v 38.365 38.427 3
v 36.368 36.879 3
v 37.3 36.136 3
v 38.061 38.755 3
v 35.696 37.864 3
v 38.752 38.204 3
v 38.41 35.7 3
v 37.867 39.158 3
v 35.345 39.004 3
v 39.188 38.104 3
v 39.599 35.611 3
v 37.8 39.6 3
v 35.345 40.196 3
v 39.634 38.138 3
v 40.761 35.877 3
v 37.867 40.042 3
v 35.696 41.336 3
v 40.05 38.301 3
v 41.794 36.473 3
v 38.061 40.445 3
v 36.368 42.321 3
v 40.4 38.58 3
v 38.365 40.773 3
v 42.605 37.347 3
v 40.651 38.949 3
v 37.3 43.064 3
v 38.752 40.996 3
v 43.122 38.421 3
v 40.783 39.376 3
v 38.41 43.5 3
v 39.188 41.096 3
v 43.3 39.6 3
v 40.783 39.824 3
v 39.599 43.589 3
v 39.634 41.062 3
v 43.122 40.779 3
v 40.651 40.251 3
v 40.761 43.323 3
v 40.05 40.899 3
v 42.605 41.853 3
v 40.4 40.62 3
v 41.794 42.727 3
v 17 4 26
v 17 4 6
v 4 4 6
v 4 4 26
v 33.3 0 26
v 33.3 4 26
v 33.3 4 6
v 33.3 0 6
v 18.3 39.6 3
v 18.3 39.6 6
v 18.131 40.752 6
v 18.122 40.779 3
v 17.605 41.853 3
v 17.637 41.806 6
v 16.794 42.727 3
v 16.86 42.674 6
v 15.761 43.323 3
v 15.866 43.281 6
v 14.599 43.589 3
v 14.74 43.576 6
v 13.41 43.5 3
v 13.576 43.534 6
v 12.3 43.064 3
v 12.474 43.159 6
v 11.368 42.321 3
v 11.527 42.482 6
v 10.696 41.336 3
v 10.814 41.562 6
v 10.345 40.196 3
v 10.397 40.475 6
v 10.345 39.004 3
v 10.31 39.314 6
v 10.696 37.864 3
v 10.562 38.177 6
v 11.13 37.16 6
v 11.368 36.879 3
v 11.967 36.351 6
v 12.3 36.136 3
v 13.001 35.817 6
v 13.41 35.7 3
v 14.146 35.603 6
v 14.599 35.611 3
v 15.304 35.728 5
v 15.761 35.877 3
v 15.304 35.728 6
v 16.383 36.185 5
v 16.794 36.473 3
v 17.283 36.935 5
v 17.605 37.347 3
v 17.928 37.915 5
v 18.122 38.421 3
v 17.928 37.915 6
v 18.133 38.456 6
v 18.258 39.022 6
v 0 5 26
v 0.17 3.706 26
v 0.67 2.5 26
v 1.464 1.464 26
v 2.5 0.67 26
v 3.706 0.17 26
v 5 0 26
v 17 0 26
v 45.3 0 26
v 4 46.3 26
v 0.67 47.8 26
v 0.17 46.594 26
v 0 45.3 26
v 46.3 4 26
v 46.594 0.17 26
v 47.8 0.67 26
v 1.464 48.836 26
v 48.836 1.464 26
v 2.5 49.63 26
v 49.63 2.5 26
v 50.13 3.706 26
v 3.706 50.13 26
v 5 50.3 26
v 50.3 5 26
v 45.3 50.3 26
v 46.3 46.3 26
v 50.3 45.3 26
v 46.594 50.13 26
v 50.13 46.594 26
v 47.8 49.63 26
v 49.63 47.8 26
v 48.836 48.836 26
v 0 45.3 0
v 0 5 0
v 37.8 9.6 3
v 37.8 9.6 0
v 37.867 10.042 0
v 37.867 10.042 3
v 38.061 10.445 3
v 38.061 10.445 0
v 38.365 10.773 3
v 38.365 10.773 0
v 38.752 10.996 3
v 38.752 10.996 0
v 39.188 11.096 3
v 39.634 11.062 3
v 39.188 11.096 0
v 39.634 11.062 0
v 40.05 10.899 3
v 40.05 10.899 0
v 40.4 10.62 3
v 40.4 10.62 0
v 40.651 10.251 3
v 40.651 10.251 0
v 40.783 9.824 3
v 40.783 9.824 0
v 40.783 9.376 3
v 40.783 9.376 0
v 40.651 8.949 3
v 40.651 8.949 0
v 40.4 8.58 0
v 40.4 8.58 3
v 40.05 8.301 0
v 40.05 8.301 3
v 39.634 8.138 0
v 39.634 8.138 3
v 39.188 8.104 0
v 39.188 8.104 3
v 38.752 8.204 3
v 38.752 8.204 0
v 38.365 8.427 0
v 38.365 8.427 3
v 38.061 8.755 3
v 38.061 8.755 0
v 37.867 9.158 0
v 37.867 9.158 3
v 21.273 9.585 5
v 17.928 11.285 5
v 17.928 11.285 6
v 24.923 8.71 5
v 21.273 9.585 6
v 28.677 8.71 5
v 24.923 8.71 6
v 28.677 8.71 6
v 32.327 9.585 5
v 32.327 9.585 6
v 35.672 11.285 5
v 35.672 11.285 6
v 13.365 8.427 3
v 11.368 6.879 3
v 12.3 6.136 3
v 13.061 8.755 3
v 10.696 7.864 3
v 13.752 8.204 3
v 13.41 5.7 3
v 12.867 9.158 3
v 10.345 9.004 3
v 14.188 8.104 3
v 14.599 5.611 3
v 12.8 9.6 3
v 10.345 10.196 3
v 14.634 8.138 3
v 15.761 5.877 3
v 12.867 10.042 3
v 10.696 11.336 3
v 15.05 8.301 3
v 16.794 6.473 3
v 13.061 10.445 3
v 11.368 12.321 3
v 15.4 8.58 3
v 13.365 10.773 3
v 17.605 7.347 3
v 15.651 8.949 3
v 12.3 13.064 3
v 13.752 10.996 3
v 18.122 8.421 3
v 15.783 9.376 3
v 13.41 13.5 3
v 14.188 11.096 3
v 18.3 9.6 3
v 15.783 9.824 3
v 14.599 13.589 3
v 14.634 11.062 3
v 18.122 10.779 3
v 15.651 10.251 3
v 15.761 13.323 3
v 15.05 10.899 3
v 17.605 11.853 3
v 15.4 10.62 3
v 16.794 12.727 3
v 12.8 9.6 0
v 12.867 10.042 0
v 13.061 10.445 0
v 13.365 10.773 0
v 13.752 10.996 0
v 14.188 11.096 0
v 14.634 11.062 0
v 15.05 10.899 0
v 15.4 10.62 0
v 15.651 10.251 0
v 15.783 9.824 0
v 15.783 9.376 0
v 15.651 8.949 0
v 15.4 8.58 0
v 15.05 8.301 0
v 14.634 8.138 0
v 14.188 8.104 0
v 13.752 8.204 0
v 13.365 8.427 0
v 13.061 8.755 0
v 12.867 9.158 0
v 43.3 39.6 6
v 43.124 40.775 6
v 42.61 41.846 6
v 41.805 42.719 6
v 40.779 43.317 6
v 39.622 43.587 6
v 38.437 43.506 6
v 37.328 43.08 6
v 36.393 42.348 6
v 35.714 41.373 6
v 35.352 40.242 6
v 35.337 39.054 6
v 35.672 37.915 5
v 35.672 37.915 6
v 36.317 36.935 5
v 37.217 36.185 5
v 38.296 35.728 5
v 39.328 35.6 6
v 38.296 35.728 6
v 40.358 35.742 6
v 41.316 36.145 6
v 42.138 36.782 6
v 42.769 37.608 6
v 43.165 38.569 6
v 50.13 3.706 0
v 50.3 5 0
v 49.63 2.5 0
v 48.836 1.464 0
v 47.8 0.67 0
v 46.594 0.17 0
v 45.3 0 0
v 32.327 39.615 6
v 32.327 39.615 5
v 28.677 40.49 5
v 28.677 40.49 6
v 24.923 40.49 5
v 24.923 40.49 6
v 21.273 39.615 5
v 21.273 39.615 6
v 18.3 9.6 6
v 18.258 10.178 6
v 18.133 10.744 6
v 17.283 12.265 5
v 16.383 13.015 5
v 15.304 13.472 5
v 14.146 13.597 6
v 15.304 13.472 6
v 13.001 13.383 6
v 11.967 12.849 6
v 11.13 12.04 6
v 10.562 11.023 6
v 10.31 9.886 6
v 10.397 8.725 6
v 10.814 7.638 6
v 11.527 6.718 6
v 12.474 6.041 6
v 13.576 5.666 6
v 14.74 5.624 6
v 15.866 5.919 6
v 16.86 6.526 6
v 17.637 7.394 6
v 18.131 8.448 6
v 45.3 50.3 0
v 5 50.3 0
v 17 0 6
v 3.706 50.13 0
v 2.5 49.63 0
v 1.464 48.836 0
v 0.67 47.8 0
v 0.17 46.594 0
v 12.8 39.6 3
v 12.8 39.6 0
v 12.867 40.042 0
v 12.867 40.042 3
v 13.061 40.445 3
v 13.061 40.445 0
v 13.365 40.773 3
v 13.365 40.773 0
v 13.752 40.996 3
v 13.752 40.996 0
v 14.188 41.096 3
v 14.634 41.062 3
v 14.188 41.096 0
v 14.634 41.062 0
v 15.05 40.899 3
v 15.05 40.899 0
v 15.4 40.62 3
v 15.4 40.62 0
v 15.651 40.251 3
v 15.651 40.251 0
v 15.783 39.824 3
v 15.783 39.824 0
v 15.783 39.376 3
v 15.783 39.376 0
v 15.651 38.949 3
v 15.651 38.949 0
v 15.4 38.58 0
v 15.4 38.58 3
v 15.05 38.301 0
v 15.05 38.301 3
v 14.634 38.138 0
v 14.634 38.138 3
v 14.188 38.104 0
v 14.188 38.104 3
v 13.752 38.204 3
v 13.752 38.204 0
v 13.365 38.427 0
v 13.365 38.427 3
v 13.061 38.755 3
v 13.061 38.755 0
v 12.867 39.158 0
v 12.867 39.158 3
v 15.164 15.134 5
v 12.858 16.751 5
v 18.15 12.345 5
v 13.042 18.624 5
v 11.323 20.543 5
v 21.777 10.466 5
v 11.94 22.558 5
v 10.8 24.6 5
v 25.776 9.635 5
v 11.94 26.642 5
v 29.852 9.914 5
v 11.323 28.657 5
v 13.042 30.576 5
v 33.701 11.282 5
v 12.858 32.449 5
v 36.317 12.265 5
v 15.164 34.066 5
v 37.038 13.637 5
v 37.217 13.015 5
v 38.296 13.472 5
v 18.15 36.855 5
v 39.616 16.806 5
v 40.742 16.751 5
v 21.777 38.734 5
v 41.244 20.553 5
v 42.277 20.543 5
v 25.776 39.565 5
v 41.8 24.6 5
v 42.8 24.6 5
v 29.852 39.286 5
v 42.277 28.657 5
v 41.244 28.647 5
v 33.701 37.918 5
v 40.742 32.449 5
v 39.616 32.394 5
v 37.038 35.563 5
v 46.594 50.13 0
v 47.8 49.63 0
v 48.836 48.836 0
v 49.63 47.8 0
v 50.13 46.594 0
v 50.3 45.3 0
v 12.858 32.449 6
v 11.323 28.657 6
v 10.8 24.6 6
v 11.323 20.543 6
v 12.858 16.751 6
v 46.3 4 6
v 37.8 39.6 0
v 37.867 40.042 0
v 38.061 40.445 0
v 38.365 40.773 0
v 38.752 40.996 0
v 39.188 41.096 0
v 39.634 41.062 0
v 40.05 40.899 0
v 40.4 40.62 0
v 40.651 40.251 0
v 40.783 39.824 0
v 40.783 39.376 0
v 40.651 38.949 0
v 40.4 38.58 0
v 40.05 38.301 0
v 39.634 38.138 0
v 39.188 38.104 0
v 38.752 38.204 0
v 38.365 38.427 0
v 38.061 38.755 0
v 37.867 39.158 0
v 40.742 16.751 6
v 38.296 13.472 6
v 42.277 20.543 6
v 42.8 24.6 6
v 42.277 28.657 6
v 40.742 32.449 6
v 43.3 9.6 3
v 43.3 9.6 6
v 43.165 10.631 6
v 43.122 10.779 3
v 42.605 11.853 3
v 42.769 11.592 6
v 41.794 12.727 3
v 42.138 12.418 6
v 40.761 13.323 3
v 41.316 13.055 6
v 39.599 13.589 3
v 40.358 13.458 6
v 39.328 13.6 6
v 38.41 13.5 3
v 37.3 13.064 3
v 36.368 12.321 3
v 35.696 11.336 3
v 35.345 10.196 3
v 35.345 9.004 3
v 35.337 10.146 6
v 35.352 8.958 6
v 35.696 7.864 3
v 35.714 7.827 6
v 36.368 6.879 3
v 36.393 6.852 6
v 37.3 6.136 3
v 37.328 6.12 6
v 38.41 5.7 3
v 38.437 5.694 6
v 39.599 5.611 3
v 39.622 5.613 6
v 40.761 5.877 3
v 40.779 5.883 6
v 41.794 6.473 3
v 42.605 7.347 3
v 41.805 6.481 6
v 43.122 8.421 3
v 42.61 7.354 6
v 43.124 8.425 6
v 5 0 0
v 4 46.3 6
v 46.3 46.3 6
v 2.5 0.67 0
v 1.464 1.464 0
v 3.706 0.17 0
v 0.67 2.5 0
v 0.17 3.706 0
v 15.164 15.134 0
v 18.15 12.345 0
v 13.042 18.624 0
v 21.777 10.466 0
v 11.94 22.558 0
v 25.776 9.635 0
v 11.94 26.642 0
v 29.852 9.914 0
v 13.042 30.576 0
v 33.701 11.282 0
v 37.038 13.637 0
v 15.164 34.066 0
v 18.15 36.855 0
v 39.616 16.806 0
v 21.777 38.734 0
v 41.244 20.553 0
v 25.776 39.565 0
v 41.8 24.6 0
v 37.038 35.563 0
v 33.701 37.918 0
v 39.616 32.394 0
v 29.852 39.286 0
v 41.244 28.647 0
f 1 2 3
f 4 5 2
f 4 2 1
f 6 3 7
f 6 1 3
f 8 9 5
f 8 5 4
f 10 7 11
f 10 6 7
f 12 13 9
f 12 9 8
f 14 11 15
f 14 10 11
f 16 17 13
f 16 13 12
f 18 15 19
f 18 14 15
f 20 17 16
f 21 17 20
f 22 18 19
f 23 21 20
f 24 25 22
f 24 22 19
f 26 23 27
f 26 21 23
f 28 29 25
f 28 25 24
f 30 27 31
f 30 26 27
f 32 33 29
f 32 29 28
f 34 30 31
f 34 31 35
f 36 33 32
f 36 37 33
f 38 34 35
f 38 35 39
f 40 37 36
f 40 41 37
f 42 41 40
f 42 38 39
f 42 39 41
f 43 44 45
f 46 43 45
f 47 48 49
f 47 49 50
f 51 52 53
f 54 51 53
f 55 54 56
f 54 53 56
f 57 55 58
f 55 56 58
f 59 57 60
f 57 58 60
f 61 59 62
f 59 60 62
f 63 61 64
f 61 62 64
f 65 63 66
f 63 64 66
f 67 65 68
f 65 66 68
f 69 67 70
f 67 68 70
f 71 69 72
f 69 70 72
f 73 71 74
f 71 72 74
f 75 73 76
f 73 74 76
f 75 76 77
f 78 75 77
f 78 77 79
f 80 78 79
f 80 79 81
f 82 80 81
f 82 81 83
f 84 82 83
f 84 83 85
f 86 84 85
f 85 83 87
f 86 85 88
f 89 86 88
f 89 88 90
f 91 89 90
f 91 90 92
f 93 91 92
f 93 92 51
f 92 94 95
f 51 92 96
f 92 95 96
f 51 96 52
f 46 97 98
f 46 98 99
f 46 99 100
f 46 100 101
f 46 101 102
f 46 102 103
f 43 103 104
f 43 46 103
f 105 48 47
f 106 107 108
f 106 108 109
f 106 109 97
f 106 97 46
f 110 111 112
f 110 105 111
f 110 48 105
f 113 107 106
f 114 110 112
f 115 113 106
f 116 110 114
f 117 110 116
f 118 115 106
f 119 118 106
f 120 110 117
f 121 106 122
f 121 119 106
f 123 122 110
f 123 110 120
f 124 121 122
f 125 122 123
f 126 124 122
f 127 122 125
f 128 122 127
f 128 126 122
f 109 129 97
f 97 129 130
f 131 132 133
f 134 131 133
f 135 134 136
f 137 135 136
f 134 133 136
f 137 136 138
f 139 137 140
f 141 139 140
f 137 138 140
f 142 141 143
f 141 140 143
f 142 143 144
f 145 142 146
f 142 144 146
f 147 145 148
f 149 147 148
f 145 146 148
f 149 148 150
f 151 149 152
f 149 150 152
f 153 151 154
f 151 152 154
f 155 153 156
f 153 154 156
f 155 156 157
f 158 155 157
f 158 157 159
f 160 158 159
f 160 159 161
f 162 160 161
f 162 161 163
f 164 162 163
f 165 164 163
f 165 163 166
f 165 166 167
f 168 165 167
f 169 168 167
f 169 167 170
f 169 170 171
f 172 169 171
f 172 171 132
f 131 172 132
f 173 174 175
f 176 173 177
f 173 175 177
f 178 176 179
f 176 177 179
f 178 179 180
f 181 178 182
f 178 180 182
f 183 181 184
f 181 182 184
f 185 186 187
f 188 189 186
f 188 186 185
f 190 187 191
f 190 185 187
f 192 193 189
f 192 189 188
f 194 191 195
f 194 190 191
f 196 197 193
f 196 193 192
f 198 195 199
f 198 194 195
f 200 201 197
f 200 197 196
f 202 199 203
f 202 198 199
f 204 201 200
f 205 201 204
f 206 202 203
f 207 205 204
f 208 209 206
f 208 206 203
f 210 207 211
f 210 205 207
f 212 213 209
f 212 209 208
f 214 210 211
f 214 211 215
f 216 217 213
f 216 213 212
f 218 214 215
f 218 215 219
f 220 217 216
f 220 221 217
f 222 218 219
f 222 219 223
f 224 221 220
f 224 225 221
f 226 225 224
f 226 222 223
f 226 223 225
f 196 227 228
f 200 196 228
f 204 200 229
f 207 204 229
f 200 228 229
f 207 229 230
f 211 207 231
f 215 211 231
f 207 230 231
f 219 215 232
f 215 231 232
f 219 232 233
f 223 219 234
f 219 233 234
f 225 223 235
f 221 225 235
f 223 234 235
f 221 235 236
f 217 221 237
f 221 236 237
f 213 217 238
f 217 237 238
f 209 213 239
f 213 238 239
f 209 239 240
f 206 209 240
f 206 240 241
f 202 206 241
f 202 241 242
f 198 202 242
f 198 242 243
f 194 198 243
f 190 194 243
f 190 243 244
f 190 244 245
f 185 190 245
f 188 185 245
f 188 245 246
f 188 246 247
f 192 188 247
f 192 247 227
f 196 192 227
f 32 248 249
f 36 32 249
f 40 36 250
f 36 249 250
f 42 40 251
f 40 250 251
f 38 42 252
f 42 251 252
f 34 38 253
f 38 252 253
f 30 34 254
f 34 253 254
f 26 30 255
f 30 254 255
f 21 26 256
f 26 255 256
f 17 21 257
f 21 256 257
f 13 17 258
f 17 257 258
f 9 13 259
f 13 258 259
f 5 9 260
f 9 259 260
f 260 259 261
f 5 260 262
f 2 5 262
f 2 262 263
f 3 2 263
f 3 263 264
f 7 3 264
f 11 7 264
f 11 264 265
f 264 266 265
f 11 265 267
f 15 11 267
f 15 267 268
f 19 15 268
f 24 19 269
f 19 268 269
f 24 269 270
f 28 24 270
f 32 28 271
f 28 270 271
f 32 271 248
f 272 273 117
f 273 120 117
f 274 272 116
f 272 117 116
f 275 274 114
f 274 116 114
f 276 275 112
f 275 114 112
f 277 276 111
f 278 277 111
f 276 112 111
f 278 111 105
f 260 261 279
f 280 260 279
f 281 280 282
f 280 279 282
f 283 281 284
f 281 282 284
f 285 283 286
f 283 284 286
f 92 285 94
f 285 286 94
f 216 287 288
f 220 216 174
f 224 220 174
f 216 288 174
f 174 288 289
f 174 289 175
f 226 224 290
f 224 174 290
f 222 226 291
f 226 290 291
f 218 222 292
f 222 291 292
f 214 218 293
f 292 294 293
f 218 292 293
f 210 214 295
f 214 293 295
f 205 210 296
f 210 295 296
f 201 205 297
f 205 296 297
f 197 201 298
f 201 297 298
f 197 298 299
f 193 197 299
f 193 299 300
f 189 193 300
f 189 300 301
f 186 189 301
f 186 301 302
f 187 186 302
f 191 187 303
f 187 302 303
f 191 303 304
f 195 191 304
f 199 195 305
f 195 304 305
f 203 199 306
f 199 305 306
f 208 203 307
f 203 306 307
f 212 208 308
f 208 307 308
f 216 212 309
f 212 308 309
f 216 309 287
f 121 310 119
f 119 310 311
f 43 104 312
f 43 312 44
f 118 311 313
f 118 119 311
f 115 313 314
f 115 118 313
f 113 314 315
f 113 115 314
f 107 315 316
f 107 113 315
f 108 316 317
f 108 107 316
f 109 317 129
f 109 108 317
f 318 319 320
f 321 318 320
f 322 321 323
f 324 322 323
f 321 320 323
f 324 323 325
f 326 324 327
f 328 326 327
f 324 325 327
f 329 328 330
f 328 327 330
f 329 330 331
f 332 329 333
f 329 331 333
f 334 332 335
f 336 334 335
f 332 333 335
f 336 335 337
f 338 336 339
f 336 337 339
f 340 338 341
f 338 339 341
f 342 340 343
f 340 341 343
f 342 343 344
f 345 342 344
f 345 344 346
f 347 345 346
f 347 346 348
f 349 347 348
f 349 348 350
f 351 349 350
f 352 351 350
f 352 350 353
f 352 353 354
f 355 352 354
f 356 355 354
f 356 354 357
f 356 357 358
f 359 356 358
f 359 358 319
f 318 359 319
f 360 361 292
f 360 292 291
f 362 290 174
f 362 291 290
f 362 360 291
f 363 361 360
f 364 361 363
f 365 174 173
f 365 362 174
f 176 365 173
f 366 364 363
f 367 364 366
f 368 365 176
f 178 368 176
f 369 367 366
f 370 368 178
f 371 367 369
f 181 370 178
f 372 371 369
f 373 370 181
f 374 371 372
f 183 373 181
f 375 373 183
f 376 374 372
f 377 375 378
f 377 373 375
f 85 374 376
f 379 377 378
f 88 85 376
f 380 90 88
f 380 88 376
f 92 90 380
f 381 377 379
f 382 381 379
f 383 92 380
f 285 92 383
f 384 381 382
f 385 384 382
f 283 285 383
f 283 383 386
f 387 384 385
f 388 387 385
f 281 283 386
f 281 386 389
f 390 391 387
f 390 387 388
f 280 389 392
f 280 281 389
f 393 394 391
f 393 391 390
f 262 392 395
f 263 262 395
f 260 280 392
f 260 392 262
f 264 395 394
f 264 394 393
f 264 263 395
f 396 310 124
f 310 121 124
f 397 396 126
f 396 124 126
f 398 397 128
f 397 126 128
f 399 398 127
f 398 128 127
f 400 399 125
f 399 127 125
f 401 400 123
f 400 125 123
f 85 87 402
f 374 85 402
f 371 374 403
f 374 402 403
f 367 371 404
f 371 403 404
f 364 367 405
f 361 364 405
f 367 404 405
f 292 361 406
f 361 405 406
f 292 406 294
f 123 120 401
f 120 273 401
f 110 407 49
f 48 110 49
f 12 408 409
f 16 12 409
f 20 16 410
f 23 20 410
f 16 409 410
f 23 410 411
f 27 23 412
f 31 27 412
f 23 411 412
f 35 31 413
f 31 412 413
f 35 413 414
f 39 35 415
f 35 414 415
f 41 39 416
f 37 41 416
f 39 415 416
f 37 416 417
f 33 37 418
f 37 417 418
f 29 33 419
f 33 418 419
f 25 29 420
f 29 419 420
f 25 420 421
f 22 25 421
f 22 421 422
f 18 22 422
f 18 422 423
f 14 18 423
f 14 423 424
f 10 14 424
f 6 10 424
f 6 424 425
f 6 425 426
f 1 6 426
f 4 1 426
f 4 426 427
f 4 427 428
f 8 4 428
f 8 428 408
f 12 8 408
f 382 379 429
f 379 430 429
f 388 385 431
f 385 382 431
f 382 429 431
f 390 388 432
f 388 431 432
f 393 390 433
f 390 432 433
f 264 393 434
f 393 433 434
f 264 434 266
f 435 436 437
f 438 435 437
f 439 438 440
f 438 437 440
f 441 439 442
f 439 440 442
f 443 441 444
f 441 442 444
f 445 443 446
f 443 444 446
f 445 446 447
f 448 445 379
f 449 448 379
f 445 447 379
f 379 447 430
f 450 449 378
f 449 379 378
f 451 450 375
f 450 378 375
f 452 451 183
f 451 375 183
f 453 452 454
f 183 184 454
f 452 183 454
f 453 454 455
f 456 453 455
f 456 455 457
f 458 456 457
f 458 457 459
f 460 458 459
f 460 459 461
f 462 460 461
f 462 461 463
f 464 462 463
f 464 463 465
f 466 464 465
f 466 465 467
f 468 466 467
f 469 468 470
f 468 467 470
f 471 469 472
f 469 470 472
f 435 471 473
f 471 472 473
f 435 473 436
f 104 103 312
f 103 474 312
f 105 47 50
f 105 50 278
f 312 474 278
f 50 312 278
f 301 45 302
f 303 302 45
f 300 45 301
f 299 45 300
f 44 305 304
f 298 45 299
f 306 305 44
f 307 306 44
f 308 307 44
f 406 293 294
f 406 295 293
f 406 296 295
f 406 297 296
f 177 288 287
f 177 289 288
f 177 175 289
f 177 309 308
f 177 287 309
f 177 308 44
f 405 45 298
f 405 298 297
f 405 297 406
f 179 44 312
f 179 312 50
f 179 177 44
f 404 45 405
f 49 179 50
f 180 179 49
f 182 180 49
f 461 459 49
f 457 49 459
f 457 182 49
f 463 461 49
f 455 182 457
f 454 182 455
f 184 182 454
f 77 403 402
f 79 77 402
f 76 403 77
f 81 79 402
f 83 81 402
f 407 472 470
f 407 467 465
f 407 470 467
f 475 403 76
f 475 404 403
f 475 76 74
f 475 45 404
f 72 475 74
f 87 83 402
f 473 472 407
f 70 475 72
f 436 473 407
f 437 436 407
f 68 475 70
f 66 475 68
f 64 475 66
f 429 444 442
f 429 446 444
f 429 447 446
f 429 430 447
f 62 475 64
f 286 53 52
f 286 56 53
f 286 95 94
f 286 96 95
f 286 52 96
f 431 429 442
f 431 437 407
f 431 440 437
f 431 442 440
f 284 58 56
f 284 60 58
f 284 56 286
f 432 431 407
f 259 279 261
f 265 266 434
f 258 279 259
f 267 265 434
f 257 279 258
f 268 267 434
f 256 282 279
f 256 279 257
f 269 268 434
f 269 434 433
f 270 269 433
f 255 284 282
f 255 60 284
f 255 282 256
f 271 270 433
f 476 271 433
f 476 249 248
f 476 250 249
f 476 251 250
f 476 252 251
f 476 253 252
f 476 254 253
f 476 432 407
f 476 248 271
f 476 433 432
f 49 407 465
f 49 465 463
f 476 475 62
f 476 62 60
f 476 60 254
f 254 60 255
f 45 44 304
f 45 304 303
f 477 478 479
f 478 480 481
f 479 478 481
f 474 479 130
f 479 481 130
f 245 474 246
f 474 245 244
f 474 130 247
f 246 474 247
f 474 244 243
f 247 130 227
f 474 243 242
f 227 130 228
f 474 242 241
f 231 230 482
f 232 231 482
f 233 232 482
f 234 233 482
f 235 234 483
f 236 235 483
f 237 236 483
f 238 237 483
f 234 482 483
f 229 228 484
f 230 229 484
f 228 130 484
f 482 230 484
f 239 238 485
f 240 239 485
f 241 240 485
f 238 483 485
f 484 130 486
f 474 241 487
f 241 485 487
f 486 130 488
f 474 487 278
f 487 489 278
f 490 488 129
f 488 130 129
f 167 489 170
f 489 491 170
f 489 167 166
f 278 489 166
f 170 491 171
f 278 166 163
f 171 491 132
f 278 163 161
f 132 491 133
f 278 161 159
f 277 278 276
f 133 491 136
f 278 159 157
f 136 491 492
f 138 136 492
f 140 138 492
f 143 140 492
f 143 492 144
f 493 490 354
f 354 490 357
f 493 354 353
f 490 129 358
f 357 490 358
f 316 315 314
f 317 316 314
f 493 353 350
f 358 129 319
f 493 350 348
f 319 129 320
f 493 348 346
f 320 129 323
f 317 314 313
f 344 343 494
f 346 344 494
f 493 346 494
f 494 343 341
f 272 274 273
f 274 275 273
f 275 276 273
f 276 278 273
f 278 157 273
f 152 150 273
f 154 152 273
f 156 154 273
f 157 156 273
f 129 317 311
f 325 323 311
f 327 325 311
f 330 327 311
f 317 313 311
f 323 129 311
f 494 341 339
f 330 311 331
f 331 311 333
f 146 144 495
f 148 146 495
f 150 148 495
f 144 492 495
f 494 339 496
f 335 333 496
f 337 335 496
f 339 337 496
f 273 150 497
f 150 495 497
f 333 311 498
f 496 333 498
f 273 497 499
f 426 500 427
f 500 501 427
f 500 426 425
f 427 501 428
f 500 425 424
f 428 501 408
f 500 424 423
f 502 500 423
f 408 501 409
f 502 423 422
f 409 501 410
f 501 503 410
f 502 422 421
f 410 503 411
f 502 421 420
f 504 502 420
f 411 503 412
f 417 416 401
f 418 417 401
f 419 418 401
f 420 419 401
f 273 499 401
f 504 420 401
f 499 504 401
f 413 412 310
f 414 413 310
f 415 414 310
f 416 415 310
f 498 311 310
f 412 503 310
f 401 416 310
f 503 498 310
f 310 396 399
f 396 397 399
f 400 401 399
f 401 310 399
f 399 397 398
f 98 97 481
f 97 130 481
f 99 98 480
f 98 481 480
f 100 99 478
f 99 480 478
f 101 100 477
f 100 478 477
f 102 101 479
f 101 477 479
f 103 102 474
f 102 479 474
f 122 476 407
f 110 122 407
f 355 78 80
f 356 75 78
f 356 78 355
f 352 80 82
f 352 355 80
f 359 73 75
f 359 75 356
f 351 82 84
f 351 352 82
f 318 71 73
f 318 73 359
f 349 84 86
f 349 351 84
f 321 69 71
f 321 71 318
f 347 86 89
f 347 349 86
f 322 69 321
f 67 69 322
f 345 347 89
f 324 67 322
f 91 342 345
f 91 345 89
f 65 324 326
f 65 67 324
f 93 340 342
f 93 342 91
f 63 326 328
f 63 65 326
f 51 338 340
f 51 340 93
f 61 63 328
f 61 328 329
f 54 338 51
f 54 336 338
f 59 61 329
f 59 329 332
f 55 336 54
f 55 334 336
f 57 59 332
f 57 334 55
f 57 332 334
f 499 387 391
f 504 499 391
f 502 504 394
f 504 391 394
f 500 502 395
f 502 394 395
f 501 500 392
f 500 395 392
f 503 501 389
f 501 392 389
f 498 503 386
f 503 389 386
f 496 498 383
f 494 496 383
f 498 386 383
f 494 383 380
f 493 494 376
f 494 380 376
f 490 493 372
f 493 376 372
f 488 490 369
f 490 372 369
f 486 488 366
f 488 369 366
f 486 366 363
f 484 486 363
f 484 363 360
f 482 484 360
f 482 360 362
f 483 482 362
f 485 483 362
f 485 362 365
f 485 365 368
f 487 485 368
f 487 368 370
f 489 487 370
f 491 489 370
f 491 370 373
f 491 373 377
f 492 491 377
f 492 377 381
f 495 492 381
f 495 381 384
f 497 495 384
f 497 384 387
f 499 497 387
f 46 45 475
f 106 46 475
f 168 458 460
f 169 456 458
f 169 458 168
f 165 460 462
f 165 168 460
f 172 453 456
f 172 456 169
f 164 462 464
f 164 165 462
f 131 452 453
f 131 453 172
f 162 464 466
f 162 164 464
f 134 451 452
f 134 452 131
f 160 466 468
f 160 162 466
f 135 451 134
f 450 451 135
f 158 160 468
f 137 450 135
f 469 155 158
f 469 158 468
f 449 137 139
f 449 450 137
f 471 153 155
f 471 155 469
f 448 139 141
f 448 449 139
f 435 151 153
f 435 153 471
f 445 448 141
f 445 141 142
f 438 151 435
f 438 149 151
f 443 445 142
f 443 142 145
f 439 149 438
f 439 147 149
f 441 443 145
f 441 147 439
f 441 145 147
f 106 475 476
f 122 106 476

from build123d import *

# Parameters (mm, degrees)
ESQUISSE1_W             = 50.3
ESQUISSE1_H             = 50.3
BOSS_EXTRU_1_DEPTH      = 6
BOSS_EXTRU_2_DEPTH      = 20
ESQUISSE3_R             = 1.5
ENL_V_MAT_EXTRU_1_DEPTH = 76.737573238
CONG_2_R                = 5
ESQUISSE4_R             = 4
ENL_V_MAT_EXTRU_2_DEPTH = 3
CONG_6_R                = 5
ESQUISSE5_R             = 16
ENL_V_MAT_EXTRU_3_DEPTH = 1
ESQUISSE6_R             = 15
ENL_V_MAT_EXTRU_4_DEPTH = 21


with BuildPart() as part:
    # Esquisse1 → Boss.-Extru.1 (new body)
    with BuildSketch(Plane.XY):
        with Locations((25.15, 25.15)):
            Rectangle(ESQUISSE1_W, ESQUISSE1_H)
    extrude(amount=BOSS_EXTRU_1_DEPTH)

    # Esquisse2 → Boss.-Extru.2 (add)
    with BuildSketch(Plane.XY.offset(6)):
        Polygon((4, 46.3), (46.3, 46.3), (46.3, 4), (33.3, 4), (33.3, 0), (50.3, 0), (50.3, 50.3), (0, 50.3), (0, 0), (17, 0), (17, 4), (4, 4), align=None)
    extrude(amount=BOSS_EXTRU_2_DEPTH)

    # Esquisse3 → Enlèv. mat.-Extru.1 (cut, through all)
    with BuildSketch(Plane(origin=(0, 0, 0), x_dir=(-1, 0, 0), z_dir=(0, 0, -1))):
        with Locations((-39.3, 39.6)):
            Circle(ESQUISSE3_R)
        with Locations((-14.3, 39.6)):
            Circle(ESQUISSE3_R)
        with Locations((-14.3, 9.6)):
            Circle(ESQUISSE3_R)
        with Locations((-39.3, 9.6)):
            Circle(ESQUISSE3_R)
    extrude(amount=-ENL_V_MAT_EXTRU_1_DEPTH, mode=Mode.SUBTRACT)

    # Congé2
    cong_2_edges = [part.edges().sort_by_distance(p)[0] for p in [
        (0, 50.3, 13),
    ]]
    fillet(cong_2_edges, radius=CONG_2_R)

    # Esquisse4 → Enlèv. mat.-Extru.2 (cut)
    with BuildSketch(Plane.XY.offset(6)):
        with Locations((14.3, 39.6)):
            Circle(ESQUISSE4_R)
        with Locations((39.3, 39.6)):
            Circle(ESQUISSE4_R)
        with Locations((39.3, 9.6)):
            Circle(ESQUISSE4_R)
        with Locations((14.3, 9.6)):
            Circle(ESQUISSE4_R)
    extrude(amount=-ENL_V_MAT_EXTRU_2_DEPTH, mode=Mode.SUBTRACT)

    # Congé6
    cong_6_edges = [part.edges().sort_by_distance(p)[0] for p in [
        (50.3, 50.3, 13),
        (50.3, 0, 13),
        (0, 0, 13),
    ]]
    fillet(cong_6_edges, radius=CONG_6_R)

    # Esquisse5 → Enlèv. mat.-Extru.3 (cut)
    with BuildSketch(Plane.XY.offset(6)):
        with Locations((26.8, 24.6)):
            Circle(ESQUISSE5_R)
    extrude(amount=-ENL_V_MAT_EXTRU_3_DEPTH, mode=Mode.SUBTRACT)

    # Esquisse6 → Enlèv. mat.-Extru.4 (cut)
    with BuildSketch(Plane.XY.offset(5)):
        with Locations((26.8, 24.6)):
            Circle(ESQUISSE6_R)
    extrude(amount=-ENL_V_MAT_EXTRU_4_DEPTH, mode=Mode.SUBTRACT)


solid = part.part
